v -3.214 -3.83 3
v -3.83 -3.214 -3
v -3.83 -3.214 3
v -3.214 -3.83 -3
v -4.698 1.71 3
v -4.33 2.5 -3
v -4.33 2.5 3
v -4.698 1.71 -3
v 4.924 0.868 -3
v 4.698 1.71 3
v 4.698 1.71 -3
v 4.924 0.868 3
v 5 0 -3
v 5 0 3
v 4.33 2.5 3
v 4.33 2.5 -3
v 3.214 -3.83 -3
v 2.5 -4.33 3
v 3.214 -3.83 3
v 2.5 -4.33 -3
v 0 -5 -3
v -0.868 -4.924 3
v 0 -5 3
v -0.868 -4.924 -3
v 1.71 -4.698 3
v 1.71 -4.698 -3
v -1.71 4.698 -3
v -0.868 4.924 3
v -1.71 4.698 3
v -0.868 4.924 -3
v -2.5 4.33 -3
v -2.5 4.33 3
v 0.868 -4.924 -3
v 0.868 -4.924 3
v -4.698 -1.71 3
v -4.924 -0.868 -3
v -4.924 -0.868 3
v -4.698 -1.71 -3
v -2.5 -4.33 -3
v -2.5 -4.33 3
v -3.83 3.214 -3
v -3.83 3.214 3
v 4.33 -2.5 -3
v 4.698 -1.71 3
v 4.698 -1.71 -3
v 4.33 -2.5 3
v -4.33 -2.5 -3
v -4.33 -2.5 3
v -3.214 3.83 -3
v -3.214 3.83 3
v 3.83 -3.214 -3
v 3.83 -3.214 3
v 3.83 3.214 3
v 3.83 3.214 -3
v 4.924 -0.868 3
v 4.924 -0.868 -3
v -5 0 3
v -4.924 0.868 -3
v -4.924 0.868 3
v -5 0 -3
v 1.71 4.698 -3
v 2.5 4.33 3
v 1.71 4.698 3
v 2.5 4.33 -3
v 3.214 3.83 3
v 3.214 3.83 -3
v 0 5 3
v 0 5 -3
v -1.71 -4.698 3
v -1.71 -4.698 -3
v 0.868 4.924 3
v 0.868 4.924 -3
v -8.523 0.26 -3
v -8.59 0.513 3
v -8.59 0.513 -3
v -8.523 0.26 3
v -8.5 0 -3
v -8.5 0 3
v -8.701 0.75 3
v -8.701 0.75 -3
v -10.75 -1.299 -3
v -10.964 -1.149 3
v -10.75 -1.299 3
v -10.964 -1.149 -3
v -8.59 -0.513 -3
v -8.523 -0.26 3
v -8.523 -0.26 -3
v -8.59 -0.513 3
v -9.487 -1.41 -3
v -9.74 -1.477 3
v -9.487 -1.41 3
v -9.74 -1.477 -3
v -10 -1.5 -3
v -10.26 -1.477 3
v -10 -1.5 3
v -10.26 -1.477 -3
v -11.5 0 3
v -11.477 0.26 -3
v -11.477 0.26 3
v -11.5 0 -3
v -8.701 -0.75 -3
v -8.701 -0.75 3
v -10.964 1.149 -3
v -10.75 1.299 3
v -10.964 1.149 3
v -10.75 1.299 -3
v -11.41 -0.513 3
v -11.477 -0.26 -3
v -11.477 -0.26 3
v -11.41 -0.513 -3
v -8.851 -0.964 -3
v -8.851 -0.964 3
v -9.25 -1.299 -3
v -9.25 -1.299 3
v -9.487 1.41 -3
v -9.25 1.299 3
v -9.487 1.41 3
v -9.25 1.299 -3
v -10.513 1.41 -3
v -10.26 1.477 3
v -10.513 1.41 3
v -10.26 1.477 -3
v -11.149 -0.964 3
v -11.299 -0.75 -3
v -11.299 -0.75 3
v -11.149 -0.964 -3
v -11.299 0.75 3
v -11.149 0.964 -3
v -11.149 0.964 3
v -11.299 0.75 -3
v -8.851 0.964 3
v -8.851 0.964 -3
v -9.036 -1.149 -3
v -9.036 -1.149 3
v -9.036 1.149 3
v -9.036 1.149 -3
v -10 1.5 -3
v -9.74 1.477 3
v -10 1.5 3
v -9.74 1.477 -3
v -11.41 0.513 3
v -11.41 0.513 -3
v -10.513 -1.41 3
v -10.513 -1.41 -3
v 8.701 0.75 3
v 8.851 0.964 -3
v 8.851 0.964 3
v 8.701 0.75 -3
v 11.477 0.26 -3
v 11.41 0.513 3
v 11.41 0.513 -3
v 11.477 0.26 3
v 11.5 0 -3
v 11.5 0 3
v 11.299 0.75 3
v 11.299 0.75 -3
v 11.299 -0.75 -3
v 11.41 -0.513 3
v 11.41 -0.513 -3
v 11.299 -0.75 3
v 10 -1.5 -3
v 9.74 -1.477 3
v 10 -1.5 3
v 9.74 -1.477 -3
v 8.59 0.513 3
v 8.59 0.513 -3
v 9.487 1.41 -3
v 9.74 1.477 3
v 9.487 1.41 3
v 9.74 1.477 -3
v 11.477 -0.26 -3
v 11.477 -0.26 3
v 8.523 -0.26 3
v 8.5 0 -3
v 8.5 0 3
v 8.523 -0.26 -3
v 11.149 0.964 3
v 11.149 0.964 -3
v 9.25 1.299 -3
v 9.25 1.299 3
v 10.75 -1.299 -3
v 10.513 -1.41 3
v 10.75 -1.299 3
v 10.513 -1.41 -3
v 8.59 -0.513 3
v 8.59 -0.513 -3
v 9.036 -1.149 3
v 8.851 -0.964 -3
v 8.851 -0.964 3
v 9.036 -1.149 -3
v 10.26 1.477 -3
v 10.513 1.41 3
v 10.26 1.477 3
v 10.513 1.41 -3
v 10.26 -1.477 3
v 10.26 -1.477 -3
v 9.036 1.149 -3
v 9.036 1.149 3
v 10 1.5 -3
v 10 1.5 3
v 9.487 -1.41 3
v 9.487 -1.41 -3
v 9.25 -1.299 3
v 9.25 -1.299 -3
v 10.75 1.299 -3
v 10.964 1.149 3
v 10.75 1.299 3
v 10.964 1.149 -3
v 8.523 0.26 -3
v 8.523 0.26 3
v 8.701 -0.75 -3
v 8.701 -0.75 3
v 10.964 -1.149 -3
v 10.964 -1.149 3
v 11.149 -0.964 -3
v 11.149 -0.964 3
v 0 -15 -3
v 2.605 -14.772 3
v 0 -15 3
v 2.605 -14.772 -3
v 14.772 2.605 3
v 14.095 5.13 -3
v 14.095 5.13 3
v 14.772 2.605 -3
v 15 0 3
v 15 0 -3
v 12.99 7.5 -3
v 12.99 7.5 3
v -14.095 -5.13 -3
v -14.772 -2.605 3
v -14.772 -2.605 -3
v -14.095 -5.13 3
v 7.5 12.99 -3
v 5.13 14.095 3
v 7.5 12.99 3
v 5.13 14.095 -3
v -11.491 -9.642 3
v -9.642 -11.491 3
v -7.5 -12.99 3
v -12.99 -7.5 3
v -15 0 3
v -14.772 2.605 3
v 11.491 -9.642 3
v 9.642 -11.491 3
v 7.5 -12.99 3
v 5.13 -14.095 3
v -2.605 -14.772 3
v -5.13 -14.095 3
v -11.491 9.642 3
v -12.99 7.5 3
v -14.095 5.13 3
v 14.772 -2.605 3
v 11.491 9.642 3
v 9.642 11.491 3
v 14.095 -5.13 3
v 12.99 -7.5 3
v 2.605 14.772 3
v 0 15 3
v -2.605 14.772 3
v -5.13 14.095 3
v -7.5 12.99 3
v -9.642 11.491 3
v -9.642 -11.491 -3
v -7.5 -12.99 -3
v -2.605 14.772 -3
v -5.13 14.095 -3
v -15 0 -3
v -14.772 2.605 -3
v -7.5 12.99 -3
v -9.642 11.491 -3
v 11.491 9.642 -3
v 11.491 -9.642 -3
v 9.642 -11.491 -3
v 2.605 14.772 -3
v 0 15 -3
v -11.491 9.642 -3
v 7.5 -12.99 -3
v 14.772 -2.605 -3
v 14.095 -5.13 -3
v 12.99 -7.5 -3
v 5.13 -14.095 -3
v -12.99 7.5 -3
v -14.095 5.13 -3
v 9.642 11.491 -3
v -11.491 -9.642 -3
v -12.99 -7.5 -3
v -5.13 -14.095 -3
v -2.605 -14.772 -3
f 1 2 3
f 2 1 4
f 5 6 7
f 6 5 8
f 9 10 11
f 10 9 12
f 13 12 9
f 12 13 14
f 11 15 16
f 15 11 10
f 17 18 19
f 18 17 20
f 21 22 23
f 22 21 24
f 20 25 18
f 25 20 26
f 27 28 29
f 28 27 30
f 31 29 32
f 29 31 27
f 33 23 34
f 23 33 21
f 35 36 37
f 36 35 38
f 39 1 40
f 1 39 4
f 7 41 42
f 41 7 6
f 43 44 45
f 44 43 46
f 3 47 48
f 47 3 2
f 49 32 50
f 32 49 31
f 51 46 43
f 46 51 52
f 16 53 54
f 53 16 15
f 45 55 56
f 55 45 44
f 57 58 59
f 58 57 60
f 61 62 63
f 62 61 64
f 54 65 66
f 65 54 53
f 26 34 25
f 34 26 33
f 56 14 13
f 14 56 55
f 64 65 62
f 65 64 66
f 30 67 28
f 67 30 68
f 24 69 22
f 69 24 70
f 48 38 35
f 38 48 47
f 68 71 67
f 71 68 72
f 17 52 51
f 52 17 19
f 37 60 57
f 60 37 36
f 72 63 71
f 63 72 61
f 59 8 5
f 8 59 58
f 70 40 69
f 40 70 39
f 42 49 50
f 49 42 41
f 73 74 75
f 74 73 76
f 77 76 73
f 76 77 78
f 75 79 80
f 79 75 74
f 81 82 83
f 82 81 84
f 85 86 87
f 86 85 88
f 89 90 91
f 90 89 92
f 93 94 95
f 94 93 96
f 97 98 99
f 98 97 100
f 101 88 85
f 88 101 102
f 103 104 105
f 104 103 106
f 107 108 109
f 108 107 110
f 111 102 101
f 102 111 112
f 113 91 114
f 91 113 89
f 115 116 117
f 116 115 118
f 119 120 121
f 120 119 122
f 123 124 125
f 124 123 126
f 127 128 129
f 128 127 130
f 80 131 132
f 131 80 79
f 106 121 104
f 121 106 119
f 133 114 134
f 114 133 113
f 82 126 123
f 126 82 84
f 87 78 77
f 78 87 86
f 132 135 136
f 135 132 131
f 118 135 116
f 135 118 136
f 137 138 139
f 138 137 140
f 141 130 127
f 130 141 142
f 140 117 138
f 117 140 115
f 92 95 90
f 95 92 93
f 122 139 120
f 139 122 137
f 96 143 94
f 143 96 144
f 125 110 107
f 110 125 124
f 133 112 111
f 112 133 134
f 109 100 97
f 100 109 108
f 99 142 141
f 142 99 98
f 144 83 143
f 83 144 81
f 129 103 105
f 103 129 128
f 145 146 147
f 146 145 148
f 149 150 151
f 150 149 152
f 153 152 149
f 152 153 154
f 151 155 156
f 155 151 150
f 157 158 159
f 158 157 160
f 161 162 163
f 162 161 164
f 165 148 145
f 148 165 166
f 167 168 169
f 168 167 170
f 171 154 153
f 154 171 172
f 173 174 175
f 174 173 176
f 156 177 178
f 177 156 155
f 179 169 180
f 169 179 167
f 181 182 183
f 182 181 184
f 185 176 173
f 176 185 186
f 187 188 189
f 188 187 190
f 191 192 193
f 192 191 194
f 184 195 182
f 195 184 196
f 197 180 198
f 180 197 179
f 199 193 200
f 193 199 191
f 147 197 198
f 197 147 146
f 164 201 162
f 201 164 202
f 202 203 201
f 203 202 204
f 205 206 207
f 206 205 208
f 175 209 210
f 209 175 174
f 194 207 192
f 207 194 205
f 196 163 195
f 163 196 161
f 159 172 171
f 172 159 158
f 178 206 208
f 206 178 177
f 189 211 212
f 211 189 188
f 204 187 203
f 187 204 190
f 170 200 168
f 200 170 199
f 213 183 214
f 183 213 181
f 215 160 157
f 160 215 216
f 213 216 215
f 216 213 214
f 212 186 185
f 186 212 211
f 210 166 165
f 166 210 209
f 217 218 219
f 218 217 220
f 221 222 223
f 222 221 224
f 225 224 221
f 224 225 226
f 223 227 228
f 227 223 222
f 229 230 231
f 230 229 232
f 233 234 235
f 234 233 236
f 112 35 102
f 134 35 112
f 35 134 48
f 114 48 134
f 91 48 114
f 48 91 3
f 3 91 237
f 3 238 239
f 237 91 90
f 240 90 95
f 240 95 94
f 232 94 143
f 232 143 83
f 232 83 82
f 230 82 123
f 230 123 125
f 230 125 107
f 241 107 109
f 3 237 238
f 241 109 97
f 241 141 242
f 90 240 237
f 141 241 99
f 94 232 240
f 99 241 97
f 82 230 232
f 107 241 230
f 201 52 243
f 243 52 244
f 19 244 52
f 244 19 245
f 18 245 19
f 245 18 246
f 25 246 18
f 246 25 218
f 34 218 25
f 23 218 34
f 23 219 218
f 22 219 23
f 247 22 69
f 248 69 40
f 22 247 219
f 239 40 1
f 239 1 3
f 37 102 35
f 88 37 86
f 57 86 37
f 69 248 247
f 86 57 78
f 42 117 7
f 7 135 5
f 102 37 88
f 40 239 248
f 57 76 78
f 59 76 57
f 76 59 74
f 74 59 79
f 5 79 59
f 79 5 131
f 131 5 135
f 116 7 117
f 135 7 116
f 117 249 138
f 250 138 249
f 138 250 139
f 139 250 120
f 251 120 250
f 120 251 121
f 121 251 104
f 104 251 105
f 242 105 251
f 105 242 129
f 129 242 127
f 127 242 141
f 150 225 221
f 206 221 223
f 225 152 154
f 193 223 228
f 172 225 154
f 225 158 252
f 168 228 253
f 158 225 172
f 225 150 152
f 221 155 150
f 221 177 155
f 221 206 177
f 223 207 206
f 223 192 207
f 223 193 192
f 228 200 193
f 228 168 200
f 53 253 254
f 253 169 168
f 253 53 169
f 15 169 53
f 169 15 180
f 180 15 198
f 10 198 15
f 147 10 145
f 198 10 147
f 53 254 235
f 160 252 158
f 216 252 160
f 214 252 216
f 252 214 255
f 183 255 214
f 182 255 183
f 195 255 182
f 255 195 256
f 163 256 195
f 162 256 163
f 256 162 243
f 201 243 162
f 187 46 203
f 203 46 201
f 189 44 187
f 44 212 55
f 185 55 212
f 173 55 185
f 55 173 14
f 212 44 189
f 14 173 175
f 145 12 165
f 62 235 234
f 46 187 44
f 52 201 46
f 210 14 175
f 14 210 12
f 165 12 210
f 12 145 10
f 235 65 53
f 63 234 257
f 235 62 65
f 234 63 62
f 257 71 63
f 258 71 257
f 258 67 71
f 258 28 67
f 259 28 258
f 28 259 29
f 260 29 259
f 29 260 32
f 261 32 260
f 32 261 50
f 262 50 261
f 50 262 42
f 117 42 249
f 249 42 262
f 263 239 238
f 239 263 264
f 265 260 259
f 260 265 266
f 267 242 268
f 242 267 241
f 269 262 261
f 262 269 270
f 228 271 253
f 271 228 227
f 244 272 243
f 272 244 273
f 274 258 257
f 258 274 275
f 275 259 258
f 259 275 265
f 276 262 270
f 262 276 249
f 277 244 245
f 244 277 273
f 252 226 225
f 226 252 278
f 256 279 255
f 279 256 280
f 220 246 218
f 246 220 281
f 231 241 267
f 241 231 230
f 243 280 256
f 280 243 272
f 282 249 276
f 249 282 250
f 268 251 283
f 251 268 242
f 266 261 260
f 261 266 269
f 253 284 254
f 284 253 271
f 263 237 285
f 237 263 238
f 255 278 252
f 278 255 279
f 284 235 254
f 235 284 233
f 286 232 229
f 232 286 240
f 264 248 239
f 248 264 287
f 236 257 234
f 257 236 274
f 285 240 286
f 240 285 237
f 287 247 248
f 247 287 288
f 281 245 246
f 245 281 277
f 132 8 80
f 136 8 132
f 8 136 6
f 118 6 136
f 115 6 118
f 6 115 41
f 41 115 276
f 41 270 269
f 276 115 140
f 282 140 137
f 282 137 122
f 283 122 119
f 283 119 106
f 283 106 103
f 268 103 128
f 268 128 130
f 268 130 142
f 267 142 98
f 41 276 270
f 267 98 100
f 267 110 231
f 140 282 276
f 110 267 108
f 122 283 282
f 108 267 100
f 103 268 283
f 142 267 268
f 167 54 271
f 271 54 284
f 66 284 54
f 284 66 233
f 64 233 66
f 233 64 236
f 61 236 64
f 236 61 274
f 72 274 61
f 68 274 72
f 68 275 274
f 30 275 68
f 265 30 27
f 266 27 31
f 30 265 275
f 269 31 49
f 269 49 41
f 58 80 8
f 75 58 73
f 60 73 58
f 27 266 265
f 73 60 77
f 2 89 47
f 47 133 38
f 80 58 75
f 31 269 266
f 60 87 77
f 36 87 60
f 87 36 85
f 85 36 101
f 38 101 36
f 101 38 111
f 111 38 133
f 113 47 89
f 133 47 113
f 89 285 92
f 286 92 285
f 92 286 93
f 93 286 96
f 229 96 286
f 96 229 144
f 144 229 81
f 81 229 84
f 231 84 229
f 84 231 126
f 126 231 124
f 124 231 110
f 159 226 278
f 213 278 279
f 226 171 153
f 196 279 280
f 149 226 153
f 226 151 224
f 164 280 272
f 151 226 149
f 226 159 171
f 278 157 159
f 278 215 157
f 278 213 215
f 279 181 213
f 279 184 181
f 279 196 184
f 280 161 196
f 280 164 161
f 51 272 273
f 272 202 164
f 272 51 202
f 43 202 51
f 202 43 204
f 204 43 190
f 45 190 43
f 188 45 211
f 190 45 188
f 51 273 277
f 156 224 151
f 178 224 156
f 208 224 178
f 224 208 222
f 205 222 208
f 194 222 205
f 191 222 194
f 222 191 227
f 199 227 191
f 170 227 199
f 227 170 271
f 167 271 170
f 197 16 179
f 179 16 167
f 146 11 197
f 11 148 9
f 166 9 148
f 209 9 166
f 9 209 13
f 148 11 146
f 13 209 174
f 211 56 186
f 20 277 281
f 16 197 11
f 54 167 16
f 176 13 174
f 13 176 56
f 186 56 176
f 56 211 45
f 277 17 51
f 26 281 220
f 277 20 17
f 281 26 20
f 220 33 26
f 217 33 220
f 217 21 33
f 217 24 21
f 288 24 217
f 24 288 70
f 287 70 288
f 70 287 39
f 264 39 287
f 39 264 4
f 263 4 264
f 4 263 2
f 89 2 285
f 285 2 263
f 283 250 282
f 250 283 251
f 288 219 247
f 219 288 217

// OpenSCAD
// file: config.scad
$fn=36;



// ширина промежутка между наружными краями конусов
delta_width=45;

// диаметр отверстия
bolt_d = 3;
bolt_r = bolt_d/2;

// цилиндр крепления тяг
cyl_w = 5;
cyl_d = 10;
cyl_r = cyl_d/2;

// конус крепления тяг
con_w = 5;
con_r = bolt_r+1;
con_d = con_r*2;



// толщина всего элемента эффектора
H_effector = 6;

// диаметр круглого большого отверстия в центре
D_effector_hole = 40;

// длина стороны эффектора
L_effector = delta_width-2*con_w;

// диаметр отверстия для крепления, которых 12 штук вокруг большого отверстия
d_effector = 4;

// радиус размещения отверстий для крепления
effector_drill_r_base = (D_effector_hole/2 + sqrt(L_effector*L_effector*3/4))/2;


finger_D = 10;
finger_H = 6;
// main file
include <config.scad>;

difference() {
	cylinder(center=true, r=finger_D*1.5, h=finger_H);
	union() {
		cylinder(center=true, r=finger_D/2, h=finger_H*2);

		translate([-finger_D, 0, 0])
		cylinder(center=true, r=bolt_r, h=finger_H*2);

		translate([finger_D, 0, 0])
		cylinder(center=true, r=bolt_r, h=finger_H*2);
	}
}
